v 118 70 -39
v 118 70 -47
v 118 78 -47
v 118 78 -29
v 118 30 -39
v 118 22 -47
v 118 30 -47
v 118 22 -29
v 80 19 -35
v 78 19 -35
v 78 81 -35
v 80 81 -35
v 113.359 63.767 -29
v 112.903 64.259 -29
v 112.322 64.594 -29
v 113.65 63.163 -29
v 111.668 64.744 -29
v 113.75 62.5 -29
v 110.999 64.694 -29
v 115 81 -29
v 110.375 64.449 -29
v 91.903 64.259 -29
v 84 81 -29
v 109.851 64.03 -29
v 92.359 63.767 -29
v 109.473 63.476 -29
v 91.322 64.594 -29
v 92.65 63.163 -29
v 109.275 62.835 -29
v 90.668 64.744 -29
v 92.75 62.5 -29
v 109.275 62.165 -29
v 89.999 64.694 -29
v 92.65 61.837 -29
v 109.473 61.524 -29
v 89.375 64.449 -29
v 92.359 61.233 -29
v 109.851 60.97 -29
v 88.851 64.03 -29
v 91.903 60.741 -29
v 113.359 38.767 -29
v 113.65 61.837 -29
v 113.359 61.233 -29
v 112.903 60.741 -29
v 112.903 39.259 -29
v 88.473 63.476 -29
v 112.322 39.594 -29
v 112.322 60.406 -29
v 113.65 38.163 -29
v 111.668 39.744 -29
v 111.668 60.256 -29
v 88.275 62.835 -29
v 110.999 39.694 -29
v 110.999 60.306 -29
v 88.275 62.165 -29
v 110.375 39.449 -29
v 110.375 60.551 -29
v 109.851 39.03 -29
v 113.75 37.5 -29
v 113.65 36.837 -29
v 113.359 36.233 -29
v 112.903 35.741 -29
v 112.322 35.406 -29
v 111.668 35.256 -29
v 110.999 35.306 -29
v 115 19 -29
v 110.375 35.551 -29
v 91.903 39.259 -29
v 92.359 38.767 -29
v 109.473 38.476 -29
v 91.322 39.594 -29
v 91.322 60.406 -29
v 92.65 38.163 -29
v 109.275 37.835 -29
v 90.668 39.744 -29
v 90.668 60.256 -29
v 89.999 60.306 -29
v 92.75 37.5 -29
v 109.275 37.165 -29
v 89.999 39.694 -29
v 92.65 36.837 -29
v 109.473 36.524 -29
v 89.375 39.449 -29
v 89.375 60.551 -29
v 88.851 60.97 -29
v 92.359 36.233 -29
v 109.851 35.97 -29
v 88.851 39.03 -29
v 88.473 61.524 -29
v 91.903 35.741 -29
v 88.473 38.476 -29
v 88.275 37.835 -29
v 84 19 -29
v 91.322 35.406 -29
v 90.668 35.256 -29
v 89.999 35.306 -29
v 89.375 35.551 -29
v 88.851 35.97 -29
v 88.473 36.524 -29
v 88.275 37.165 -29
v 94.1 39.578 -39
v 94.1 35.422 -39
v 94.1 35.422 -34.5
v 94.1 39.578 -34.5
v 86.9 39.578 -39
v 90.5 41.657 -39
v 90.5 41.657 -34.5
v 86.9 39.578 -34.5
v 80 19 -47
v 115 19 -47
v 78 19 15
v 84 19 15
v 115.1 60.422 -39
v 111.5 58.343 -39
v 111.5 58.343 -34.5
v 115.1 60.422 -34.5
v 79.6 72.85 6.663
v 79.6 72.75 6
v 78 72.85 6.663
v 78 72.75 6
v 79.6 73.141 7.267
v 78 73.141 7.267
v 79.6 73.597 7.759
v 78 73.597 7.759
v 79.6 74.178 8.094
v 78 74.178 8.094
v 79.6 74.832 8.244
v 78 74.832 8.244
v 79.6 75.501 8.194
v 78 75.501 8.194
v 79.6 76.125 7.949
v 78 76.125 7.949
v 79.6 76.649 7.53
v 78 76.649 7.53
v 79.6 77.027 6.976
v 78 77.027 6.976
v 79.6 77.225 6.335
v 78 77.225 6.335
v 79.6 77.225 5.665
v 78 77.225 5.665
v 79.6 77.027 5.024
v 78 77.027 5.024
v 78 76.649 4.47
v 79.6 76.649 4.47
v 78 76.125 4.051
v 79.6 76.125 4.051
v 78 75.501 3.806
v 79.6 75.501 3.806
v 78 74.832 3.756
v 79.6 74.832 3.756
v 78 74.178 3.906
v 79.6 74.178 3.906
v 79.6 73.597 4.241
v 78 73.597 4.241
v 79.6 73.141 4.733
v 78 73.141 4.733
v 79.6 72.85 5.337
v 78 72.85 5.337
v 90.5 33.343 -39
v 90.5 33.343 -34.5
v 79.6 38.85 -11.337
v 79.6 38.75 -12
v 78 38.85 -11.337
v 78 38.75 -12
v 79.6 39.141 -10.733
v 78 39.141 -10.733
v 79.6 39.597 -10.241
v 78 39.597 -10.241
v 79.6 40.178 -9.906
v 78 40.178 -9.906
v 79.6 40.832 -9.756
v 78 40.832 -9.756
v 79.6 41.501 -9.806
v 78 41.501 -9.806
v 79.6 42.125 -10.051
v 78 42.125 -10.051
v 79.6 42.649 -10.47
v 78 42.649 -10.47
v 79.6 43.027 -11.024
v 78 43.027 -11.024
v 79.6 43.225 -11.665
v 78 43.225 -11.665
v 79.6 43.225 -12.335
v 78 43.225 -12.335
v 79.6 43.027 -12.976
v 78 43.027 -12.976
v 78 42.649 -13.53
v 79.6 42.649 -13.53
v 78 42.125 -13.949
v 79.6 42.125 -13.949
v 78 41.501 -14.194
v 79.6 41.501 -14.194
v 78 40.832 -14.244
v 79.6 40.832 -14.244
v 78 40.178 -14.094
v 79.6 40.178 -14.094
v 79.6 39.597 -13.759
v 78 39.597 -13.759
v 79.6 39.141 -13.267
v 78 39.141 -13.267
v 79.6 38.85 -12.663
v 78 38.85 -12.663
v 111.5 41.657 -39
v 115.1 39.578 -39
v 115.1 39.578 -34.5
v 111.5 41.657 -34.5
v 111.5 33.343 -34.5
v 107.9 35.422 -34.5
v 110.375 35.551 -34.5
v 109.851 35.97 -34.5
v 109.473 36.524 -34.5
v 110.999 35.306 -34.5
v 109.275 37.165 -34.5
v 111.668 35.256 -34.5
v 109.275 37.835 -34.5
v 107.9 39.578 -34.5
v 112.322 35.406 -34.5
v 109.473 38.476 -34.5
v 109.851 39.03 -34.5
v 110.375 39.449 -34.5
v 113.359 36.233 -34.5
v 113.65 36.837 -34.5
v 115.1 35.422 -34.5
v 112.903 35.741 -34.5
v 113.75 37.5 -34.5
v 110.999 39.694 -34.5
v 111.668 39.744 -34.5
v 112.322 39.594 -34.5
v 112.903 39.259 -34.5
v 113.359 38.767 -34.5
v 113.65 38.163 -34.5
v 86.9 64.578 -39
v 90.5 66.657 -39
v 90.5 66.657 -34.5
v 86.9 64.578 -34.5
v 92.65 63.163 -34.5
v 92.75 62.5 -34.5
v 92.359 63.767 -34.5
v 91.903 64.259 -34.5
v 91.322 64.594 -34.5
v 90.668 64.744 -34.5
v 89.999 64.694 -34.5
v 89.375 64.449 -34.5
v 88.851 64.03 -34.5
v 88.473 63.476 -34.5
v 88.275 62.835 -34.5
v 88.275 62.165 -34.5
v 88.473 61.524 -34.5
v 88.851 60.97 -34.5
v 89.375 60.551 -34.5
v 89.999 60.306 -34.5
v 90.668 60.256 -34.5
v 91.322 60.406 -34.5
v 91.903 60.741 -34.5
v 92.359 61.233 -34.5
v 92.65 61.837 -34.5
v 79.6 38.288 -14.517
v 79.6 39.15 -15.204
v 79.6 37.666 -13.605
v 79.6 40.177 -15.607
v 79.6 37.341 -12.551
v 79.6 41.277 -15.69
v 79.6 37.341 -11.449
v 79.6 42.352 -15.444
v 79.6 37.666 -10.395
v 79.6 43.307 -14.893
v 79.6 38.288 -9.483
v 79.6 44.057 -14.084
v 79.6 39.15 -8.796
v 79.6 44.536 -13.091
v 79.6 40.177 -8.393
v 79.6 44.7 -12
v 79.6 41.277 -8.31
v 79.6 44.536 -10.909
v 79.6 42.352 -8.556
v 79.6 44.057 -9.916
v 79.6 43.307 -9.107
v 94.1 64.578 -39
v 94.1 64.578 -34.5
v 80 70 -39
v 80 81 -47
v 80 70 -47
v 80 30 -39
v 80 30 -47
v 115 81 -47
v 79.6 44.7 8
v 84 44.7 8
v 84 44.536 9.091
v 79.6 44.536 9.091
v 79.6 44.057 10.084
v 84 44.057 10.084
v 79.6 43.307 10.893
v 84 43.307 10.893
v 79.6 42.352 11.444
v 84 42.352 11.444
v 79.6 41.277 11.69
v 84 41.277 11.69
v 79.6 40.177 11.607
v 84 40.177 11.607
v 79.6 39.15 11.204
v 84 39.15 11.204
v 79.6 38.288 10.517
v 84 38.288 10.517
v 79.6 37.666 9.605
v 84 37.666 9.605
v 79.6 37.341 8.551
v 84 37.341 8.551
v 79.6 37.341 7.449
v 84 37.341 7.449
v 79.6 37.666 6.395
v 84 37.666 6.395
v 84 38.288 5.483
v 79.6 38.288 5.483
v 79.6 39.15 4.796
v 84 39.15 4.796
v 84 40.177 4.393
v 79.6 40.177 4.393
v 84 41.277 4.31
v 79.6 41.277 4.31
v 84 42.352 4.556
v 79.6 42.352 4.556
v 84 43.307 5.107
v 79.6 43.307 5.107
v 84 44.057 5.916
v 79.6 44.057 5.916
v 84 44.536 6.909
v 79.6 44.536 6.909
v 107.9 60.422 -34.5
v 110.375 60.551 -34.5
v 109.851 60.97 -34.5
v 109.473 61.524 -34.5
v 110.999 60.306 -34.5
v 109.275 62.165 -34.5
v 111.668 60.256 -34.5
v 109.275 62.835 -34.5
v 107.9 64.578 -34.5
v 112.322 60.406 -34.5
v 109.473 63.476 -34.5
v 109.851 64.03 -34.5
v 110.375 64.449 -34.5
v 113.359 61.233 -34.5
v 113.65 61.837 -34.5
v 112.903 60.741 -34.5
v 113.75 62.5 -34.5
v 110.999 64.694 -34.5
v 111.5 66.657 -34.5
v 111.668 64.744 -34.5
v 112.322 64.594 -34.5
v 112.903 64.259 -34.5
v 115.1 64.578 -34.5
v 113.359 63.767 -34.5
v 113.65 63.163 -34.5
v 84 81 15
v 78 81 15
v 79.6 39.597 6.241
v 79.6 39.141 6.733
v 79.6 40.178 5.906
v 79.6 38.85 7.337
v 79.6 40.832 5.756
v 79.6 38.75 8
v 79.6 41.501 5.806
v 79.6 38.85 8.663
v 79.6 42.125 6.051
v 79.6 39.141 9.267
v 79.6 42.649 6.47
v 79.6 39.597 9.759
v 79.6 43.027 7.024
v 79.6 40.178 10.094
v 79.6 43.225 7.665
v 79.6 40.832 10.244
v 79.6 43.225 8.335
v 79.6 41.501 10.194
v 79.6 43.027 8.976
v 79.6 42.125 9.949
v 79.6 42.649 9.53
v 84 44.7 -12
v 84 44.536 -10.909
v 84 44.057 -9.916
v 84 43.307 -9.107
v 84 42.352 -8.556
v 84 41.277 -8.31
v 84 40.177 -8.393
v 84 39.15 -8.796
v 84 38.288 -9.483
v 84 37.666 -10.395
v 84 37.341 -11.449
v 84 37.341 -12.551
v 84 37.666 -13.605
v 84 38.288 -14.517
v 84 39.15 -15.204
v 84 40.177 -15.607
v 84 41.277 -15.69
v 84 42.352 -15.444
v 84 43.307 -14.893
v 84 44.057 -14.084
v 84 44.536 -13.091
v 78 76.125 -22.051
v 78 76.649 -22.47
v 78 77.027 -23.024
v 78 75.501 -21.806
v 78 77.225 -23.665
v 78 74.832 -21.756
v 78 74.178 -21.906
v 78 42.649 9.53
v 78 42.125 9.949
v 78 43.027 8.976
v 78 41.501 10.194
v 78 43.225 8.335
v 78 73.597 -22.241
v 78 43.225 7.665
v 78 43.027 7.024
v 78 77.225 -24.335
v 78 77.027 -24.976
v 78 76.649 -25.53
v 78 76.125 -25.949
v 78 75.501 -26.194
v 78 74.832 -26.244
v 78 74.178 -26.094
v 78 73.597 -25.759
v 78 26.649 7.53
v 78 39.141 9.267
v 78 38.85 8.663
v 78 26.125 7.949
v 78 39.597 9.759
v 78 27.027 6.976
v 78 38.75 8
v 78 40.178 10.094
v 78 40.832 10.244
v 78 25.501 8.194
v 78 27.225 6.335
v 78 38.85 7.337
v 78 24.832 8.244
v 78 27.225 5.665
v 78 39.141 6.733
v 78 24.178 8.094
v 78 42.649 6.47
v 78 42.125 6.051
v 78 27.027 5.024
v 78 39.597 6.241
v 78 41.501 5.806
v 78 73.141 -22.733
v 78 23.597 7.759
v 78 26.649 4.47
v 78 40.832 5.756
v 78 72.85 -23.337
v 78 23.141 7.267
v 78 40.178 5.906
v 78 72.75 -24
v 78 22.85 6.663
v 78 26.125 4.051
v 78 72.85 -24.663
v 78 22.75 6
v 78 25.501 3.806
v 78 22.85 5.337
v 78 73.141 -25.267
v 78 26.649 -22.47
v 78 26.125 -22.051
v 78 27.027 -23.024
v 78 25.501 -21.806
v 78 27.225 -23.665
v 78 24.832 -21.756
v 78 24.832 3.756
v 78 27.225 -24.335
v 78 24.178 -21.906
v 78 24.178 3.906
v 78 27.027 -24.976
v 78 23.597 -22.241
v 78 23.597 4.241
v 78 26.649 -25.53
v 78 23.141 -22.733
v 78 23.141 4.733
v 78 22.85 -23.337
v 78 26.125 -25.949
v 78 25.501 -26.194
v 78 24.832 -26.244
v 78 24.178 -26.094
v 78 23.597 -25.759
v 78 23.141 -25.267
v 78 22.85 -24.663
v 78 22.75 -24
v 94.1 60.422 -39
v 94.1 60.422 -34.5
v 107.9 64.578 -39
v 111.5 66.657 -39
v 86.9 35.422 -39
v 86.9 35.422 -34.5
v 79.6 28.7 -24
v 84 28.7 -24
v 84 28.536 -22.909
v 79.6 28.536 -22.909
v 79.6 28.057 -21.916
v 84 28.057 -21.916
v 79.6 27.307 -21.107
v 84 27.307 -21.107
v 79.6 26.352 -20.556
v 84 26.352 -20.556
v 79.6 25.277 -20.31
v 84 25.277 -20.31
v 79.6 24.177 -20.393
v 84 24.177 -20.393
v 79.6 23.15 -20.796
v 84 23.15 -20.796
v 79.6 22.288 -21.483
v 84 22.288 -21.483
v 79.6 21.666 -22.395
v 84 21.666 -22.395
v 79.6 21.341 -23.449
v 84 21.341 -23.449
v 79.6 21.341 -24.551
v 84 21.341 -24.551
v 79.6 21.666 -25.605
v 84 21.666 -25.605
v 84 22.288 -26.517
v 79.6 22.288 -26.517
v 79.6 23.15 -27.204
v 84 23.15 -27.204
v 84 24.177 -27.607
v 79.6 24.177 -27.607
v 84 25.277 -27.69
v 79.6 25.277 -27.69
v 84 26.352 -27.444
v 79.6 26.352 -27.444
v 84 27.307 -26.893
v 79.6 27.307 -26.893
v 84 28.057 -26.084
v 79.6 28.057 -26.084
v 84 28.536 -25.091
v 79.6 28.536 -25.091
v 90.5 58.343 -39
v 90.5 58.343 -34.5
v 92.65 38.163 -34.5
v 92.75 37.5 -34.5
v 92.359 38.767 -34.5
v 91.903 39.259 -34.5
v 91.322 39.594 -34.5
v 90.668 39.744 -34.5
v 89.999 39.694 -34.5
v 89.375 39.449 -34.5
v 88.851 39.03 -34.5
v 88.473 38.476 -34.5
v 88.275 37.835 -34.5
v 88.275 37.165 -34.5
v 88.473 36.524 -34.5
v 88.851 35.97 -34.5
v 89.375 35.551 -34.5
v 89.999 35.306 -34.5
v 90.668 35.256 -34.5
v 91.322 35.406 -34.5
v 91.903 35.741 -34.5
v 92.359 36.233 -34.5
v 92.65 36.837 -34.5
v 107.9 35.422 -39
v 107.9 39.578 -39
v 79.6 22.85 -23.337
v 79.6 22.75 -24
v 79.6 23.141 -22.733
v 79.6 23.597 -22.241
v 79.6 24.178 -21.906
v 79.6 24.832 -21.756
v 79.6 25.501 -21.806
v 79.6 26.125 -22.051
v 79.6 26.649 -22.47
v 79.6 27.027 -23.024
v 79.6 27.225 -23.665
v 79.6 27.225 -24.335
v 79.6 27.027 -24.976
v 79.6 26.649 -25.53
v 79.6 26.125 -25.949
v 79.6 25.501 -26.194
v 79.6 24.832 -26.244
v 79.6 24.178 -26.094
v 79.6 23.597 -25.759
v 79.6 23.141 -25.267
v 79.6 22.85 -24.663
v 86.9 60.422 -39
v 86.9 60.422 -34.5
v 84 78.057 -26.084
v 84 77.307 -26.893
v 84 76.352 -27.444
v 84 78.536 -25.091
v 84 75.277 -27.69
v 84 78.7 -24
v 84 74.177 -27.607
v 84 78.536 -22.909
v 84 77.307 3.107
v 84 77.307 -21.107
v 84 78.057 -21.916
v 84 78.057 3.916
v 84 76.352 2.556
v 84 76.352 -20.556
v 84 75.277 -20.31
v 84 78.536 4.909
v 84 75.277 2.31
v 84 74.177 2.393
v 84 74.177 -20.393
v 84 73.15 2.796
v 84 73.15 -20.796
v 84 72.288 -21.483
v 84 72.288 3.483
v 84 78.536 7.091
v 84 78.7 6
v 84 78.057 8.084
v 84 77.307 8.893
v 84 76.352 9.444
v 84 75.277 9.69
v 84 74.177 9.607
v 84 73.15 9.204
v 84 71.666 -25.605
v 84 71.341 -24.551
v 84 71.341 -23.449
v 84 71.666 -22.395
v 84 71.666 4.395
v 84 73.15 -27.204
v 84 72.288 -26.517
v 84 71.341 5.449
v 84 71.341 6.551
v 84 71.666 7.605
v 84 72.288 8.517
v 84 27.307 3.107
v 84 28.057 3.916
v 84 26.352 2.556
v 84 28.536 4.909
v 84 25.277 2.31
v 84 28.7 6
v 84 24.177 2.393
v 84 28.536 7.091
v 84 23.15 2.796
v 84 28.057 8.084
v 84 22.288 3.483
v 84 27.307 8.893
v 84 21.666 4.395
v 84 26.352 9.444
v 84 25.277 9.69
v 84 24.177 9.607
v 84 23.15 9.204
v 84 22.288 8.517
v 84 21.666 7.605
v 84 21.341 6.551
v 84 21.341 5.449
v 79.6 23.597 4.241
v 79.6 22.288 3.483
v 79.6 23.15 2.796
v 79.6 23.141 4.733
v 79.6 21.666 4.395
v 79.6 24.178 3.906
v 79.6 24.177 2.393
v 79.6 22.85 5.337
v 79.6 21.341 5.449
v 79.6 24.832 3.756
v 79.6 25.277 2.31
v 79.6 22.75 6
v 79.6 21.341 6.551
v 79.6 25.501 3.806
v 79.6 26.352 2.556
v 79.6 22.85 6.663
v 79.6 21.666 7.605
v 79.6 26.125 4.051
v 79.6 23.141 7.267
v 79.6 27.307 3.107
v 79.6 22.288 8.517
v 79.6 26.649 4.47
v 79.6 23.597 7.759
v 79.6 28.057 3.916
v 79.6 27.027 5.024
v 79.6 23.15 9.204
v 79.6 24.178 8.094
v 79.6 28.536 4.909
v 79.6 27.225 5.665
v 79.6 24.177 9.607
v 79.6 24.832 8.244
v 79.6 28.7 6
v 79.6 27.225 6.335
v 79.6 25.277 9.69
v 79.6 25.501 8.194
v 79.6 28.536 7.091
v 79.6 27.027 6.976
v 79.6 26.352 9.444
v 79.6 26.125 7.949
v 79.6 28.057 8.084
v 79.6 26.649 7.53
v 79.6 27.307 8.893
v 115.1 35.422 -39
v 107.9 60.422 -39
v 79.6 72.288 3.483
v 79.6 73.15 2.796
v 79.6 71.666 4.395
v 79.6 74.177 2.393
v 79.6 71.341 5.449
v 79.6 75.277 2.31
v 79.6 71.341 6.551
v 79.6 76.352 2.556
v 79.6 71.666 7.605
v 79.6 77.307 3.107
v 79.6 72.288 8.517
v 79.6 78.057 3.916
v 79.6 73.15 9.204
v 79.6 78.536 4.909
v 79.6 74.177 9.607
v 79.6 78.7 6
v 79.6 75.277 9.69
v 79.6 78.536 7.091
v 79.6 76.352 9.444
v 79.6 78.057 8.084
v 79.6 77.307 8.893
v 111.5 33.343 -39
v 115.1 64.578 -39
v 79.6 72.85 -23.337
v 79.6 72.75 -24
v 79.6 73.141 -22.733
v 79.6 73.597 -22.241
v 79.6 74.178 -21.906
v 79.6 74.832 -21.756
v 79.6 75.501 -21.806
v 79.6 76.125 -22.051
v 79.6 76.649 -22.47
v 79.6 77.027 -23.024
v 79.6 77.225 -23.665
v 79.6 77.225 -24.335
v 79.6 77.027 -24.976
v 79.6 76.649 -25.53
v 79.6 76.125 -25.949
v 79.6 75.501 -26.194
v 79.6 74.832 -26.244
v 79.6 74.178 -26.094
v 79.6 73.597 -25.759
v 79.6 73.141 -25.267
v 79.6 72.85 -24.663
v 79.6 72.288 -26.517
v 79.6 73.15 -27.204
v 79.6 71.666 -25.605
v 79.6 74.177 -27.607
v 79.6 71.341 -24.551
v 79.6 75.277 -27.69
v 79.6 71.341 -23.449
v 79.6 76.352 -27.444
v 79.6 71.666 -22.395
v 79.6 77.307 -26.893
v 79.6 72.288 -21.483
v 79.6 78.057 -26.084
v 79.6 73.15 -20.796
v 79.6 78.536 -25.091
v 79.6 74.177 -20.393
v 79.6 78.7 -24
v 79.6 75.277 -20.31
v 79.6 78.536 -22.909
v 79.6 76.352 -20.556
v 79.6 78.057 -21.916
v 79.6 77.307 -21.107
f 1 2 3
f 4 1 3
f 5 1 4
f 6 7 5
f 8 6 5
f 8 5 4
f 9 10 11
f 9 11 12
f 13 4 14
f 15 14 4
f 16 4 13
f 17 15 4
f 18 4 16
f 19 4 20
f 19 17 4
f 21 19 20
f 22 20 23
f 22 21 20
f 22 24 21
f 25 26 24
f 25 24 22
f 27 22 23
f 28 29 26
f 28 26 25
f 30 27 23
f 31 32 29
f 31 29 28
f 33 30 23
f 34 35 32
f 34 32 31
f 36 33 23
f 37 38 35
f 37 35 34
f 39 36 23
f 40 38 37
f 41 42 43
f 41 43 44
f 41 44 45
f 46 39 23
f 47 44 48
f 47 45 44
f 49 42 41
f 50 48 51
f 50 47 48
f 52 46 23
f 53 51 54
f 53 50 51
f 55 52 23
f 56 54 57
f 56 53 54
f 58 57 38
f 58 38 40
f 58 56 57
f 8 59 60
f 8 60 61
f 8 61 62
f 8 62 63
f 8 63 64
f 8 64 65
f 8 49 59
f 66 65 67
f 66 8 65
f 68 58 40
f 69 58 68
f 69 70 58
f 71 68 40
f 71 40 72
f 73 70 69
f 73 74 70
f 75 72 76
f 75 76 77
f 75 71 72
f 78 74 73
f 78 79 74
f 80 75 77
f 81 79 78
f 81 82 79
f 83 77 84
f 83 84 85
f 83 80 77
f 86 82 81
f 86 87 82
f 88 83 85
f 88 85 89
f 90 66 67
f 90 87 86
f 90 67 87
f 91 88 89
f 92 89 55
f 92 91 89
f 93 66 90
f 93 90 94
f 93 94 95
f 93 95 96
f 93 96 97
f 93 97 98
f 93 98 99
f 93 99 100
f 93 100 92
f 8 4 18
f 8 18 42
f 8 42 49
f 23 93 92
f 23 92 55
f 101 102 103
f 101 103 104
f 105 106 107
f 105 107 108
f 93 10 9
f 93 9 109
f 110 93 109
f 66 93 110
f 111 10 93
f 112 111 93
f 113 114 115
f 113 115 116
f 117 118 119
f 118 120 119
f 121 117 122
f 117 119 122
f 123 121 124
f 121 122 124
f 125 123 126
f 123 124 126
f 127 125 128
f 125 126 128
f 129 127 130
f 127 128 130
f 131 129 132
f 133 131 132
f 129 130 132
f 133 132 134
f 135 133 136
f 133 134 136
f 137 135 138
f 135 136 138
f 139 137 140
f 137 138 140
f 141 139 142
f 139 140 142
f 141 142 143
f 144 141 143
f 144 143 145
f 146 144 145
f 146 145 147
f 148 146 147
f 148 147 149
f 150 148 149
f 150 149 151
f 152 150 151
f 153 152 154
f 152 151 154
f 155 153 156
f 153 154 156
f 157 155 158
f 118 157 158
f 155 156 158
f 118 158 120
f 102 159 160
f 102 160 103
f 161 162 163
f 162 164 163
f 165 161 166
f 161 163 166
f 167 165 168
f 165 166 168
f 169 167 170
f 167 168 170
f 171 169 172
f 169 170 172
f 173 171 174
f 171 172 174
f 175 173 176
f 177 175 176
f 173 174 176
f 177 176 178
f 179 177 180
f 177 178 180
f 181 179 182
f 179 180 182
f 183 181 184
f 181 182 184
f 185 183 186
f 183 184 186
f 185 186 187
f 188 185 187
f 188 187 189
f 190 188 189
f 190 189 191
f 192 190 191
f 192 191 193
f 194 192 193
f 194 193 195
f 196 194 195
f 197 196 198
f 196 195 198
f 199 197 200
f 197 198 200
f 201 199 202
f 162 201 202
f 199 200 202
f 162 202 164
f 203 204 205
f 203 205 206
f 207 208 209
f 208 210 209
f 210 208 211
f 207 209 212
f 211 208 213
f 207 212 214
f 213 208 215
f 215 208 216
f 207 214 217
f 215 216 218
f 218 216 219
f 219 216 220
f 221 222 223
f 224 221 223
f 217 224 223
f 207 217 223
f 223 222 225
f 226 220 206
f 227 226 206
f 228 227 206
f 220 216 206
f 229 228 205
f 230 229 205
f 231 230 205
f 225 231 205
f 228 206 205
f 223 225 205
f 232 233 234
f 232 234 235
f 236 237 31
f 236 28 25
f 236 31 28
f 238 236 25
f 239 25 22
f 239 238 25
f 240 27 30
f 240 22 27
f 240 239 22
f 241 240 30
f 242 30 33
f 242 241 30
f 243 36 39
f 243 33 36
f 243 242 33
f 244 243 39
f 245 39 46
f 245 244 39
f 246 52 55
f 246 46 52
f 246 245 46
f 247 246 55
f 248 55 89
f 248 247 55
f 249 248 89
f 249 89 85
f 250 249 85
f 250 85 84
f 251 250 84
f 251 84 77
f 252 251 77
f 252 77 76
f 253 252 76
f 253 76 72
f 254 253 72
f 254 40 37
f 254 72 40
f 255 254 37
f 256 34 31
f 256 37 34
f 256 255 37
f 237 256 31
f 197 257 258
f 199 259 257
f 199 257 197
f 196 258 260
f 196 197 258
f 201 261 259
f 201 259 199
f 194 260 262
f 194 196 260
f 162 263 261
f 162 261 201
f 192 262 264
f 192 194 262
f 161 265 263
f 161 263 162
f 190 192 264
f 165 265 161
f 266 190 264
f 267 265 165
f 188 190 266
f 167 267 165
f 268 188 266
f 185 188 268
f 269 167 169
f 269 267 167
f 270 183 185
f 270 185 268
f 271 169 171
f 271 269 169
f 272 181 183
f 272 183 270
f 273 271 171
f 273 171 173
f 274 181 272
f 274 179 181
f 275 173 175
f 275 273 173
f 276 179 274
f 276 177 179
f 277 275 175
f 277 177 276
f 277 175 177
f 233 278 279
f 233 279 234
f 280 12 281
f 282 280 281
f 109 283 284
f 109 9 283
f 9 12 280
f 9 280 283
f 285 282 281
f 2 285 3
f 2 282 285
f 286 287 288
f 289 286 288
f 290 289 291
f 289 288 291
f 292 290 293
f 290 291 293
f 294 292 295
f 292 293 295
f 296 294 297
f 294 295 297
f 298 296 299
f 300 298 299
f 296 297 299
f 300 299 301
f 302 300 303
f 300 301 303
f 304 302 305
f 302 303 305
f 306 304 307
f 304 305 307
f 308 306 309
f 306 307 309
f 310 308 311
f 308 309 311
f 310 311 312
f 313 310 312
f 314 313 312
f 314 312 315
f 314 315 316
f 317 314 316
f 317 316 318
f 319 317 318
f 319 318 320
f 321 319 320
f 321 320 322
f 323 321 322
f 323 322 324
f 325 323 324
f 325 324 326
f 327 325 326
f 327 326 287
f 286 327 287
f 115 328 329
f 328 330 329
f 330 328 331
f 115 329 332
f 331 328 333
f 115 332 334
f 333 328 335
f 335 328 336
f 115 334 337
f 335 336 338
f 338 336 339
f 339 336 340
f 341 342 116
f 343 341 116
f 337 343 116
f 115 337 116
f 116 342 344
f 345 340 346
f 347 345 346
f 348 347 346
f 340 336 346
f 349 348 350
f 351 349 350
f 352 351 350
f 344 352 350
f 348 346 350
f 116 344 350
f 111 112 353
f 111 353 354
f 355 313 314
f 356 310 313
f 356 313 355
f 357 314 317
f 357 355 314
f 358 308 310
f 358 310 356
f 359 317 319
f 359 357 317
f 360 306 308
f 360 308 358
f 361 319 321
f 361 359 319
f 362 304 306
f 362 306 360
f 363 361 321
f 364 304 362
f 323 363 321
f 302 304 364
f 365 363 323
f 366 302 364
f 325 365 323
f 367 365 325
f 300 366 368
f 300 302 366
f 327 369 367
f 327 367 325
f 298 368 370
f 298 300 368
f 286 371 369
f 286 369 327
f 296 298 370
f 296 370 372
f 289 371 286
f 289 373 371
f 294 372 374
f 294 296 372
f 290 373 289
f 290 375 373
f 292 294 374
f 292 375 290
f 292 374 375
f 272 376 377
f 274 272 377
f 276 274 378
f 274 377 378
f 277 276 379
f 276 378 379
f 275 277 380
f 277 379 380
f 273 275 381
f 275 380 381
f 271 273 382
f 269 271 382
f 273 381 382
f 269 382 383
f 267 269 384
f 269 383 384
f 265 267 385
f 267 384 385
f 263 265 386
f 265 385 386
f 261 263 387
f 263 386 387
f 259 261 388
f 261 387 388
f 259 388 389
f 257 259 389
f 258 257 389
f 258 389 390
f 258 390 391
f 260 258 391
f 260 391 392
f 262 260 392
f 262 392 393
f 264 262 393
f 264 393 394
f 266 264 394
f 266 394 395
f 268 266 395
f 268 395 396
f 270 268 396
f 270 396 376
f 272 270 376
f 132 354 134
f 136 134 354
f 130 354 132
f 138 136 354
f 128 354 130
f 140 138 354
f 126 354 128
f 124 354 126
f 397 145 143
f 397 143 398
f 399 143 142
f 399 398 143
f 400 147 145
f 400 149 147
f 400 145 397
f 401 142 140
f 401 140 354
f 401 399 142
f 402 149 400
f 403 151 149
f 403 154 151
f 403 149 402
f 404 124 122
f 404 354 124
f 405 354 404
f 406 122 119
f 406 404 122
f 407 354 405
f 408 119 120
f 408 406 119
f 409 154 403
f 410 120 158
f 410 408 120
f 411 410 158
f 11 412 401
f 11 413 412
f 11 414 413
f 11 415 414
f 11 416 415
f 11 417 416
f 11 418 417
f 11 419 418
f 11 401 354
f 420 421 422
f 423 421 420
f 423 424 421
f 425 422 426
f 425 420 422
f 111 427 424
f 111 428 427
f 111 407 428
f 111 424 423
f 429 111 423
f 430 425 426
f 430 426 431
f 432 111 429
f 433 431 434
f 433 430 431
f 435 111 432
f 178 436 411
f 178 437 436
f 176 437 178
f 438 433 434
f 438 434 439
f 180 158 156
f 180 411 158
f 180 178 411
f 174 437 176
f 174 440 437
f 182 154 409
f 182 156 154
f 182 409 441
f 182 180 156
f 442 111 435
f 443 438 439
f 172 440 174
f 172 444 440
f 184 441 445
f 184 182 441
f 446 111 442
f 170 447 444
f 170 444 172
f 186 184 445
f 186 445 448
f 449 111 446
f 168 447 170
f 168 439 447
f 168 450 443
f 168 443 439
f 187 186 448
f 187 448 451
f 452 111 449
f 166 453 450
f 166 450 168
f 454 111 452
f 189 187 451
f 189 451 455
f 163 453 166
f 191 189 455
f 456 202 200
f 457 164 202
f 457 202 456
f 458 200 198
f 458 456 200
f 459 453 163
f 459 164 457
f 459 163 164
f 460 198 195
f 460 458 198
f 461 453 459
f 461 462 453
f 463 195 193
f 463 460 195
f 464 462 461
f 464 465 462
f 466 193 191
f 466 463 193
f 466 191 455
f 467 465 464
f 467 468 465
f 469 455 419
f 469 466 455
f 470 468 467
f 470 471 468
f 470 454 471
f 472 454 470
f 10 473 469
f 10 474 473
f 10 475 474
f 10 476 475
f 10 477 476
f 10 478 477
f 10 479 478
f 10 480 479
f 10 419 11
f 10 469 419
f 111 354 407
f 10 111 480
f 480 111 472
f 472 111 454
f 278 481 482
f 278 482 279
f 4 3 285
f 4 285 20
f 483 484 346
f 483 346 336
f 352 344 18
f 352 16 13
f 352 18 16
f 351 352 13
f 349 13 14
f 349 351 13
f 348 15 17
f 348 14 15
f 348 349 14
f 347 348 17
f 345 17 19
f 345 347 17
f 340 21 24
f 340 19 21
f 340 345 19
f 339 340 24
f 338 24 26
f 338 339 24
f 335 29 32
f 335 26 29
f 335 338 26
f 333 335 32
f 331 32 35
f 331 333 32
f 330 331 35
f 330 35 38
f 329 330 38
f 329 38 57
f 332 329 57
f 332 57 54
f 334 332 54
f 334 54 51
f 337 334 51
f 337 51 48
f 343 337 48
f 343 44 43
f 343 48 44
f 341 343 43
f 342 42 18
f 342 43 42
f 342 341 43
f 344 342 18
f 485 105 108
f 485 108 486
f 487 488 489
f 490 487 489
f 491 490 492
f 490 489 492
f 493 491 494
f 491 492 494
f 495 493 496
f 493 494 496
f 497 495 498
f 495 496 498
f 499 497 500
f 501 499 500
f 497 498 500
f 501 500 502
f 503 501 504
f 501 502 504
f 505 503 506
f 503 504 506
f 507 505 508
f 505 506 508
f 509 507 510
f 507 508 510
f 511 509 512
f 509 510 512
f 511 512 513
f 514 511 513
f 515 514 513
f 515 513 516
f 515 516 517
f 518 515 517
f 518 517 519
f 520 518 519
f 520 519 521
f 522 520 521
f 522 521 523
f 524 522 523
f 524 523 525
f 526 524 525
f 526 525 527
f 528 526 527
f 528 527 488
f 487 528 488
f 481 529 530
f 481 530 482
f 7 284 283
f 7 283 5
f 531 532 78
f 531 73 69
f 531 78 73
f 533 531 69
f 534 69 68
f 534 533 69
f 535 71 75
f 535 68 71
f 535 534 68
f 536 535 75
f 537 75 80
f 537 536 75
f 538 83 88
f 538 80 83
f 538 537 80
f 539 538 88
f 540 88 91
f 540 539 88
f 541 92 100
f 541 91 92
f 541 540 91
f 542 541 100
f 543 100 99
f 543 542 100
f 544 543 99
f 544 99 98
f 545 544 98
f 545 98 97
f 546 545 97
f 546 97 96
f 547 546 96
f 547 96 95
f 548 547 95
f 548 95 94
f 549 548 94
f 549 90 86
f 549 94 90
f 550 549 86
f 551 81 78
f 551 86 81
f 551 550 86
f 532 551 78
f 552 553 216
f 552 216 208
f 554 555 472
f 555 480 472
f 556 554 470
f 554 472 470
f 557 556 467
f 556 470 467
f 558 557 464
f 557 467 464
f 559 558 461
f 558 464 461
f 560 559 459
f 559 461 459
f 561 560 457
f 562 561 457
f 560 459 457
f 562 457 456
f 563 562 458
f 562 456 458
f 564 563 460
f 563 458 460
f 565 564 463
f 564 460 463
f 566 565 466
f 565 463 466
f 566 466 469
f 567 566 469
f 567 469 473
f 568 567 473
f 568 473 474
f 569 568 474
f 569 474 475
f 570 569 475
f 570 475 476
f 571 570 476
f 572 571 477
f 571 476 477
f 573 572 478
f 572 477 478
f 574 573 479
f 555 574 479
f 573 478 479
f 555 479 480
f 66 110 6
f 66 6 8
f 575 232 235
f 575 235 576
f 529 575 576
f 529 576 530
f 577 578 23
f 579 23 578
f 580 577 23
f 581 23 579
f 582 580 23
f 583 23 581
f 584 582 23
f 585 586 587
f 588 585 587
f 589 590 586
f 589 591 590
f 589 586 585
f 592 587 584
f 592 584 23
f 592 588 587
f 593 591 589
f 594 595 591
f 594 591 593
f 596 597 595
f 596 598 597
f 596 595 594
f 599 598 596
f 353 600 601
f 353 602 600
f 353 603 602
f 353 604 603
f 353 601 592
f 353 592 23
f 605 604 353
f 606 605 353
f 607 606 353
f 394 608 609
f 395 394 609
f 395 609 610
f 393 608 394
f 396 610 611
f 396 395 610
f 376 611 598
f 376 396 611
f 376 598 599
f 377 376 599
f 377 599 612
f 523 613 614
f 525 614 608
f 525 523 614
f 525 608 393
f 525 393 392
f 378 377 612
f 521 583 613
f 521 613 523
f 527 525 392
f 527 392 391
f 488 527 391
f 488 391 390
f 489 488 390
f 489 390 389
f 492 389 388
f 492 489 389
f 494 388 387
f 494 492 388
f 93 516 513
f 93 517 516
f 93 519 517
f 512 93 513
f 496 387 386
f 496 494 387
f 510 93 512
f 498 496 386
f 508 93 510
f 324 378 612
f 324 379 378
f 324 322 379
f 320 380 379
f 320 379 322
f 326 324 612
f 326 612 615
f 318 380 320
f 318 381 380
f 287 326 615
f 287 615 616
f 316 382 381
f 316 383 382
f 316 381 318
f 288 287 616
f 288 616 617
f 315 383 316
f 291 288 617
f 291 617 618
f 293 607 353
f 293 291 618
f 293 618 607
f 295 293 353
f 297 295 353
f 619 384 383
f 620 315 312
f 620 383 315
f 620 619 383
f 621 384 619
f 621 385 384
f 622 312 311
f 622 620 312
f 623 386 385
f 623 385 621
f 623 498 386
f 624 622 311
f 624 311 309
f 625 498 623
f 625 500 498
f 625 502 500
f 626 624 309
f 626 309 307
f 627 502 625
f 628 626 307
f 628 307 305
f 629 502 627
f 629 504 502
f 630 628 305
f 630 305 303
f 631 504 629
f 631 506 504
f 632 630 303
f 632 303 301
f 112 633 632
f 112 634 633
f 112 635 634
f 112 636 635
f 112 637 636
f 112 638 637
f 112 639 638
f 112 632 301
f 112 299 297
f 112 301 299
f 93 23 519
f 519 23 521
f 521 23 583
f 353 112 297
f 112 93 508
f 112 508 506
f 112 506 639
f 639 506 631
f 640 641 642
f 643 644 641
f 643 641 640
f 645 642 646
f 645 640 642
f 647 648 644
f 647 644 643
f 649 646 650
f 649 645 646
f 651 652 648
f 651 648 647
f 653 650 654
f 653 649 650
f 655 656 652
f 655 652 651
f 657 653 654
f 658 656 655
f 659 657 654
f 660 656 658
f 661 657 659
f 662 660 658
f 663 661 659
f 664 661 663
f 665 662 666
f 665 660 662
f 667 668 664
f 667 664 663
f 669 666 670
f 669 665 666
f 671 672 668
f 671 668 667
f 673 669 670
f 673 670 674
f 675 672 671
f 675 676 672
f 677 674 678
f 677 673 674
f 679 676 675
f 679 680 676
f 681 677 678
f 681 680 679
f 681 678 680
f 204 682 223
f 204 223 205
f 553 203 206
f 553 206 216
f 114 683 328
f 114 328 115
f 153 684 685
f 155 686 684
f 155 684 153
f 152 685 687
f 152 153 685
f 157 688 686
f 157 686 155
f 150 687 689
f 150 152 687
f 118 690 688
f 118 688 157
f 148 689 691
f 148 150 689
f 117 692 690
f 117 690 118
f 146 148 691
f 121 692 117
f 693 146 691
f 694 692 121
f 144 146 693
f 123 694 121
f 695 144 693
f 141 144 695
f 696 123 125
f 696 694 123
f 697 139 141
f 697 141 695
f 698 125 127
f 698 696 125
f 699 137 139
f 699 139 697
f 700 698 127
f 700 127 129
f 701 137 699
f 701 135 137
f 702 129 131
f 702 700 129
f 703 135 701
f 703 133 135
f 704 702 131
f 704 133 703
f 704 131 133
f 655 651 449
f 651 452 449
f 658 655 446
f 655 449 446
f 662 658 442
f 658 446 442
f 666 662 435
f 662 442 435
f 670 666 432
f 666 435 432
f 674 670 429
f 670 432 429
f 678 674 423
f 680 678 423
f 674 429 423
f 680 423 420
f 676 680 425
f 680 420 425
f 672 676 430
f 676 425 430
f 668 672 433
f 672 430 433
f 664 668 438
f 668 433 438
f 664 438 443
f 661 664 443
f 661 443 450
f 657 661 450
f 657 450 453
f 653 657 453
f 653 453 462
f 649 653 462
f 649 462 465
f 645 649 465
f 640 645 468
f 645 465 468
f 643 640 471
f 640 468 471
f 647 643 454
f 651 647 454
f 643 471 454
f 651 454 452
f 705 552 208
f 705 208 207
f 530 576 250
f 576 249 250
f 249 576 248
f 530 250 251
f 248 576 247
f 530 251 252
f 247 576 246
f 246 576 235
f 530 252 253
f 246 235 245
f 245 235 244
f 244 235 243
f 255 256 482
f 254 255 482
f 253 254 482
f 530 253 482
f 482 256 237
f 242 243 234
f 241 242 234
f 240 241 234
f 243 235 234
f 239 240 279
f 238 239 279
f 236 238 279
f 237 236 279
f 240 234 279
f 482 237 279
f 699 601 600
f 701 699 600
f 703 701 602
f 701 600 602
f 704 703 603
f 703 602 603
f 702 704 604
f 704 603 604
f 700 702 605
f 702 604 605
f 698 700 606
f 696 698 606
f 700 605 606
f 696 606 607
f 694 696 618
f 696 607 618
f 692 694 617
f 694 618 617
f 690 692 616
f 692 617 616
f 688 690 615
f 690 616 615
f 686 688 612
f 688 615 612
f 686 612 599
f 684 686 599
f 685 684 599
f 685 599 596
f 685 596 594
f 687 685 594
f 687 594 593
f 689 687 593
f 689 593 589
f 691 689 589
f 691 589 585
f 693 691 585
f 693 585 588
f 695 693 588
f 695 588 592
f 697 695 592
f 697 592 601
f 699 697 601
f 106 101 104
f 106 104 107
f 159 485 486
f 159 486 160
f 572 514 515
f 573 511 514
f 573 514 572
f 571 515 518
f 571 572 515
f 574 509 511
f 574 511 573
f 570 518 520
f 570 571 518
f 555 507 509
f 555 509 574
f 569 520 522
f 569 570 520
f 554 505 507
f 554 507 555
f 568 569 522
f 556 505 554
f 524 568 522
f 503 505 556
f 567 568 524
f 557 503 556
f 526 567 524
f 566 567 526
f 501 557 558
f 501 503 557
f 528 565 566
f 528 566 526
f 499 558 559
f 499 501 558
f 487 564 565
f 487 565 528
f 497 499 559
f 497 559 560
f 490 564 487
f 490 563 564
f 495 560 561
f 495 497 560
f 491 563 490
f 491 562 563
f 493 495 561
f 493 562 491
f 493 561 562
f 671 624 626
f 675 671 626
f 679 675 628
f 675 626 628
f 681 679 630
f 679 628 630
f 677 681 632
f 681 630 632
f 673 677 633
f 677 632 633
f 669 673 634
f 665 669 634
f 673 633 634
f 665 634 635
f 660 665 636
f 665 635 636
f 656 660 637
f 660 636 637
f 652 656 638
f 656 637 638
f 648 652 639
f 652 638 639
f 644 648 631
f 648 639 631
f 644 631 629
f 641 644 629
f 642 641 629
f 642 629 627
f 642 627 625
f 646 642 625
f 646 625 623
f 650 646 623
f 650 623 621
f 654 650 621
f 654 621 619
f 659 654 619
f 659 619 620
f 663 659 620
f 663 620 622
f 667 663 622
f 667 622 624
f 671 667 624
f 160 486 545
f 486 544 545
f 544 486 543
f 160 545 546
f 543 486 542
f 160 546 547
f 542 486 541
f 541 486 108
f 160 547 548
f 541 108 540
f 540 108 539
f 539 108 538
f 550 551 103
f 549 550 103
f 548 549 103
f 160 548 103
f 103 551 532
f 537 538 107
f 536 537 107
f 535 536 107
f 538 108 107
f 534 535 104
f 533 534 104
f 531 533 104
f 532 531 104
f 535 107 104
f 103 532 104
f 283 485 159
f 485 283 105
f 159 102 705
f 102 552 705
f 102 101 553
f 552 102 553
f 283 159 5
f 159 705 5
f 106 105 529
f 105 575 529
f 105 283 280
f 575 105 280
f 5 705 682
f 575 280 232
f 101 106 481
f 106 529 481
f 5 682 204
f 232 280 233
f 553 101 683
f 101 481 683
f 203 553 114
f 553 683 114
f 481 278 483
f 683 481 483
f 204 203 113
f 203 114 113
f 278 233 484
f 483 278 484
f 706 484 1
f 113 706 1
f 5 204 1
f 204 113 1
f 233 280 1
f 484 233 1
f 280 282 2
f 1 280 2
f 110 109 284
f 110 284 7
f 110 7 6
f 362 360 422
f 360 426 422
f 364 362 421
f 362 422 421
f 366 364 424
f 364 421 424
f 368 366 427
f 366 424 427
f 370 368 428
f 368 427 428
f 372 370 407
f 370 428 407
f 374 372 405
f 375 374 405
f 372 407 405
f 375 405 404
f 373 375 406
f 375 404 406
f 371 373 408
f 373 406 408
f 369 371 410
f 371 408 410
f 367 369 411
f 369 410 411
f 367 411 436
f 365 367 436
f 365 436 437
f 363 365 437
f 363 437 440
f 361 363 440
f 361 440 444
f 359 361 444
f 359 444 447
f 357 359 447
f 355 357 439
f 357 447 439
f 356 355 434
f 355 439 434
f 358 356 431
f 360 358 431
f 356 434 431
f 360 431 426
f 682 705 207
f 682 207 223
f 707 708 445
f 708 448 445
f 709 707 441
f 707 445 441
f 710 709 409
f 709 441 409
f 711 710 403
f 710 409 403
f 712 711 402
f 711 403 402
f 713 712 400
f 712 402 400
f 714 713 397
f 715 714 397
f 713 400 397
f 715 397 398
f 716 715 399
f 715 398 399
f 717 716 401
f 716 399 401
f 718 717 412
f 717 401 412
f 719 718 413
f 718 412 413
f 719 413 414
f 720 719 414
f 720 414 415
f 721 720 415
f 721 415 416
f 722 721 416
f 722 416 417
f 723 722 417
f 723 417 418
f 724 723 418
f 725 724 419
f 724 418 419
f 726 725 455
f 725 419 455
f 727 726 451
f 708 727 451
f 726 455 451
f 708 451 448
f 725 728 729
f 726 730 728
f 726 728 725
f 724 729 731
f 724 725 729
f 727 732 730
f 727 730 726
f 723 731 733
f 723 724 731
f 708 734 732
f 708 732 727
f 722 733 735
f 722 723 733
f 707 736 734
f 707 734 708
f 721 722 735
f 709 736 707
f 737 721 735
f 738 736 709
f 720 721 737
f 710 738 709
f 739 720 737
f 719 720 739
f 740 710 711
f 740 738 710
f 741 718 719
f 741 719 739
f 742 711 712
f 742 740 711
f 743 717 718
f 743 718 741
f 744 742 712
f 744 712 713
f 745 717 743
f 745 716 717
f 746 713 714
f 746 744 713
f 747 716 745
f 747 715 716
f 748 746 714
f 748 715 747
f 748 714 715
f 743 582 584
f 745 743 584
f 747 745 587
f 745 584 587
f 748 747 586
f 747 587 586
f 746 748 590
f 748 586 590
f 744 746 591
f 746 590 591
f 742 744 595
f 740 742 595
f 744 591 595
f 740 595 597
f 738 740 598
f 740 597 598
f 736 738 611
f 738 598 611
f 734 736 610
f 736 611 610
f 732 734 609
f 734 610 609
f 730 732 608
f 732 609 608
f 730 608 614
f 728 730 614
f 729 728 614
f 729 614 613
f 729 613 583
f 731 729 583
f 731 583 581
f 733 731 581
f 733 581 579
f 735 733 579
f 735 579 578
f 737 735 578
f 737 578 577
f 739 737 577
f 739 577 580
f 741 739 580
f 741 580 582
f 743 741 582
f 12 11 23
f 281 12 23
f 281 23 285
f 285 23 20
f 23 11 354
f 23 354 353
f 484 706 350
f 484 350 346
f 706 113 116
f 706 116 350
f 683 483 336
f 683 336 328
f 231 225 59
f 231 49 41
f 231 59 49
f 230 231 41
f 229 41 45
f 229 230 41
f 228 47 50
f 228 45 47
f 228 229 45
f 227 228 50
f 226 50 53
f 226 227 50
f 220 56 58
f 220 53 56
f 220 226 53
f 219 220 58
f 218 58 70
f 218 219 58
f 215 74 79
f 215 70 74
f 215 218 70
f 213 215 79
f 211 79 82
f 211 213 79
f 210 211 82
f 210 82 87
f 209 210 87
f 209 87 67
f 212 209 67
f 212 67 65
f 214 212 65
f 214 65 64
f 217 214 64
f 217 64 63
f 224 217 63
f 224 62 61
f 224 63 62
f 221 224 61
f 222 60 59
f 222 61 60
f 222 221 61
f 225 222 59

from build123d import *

# Parameters (mm, degrees)
PAD_DEPTH        = 62
HOLE_D           = 4.5
HOLE_DEPTH       = 25
HOLE_CBORE_D     = 7.4
HOLE_CBORE_DEPTH = 4.4
SKETCH069_R      = 2.25
HOLE006_DEPTH    = 60.001
POCKET022_DEPTH  = 4.5
SKETCH071_W      = 40
SKETCH071_H      = 40
POCKET023_DEPTH  = 8
CHAMFER_SIZE     = 3
CHAMFER018_SIZE  = 3


with BuildPart() as part:
    # Sketch → Pad (new body)
    with BuildSketch(Plane.XZ.offset(-19)):
        Polygon((76, 15), (76, -35), (78, -35), (78, -47), (116, -47), (116, -29), (82, -29), (82, 15), align=None)
    extrude(amount=-PAD_DEPTH)

    # Hole
    with Locations(Plane.YZ.offset(82)):
        with Locations((25, -24), (25, 6), (41, 8), (41, -12), (75, 6), (75, -24)):
            CounterBoreHole(HOLE_D / 2, HOLE_CBORE_D / 2, HOLE_CBORE_DEPTH, depth=HOLE_DEPTH)

    # Sketch069 → Hole006 (cut, through all)
    with BuildSketch(Plane.XY.offset(-45)):
        with Locations((88.5, 62.5)):
            Circle(SKETCH069_R)
        with Locations((109.5, 37.5)):
            Circle(SKETCH069_R)
        with Locations((109.5, 62.5)):
            Circle(SKETCH069_R)
        with Locations((88.5, 37.5)):
            Circle(SKETCH069_R)
    extrude(amount=HOLE006_DEPTH, mode=Mode.SUBTRACT)

    # Sketch070 → Pocket022 (cut)
    with BuildSketch(Plane.XY.offset(-39)):
        Polygon((92.1, 64.578461), (88.5, 66.656922), (84.9, 64.578461), (84.9, 60.421539), (88.5, 58.343078), (92.1, 60.421539), align=None)
        Polygon((113.1, 64.578461), (109.5, 66.656922), (105.9, 64.578461), (105.9, 60.421539), (109.5, 58.343078), (113.1, 60.421539), align=None)
        Polygon((113.1, 39.578461), (109.5, 41.656922), (105.9, 39.578461), (105.9, 35.421539), (109.5, 33.343078), (113.1, 35.421539), align=None)
        Polygon((92.1, 39.578461), (88.5, 41.656922), (84.9, 39.578461), (84.9, 35.421539), (88.5, 33.343078), (92.1, 35.421539), align=None)
    extrude(amount=POCKET022_DEPTH, mode=Mode.SUBTRACT)

    # Sketch071 → Pocket023 (cut)
    with BuildSketch(Plane.XY.offset(-47)):
        with Locations((96, 50)):
            Rectangle(SKETCH071_W, SKETCH071_H)
    extrude(amount=POCKET023_DEPTH, mode=Mode.SUBTRACT)

    # Chamfer
    chamfer_edges = [part.edges().sort_by_distance(p)[0] for p in [
        (116, 81, -38),
    ]]
    chamfer(chamfer_edges, length=CHAMFER_SIZE)

    # Chamfer018
    chamfer018_edges = [part.edges().sort_by_distance(p)[0] for p in [
        (116, 19, -38),
    ]]
    chamfer(chamfer018_edges, length=CHAMFER018_SIZE)


with BuildPart() as part_1:
    # Body placement: moved
    add(part.part.moved(Location((2, 0, 0))))


solid = part_1.part
